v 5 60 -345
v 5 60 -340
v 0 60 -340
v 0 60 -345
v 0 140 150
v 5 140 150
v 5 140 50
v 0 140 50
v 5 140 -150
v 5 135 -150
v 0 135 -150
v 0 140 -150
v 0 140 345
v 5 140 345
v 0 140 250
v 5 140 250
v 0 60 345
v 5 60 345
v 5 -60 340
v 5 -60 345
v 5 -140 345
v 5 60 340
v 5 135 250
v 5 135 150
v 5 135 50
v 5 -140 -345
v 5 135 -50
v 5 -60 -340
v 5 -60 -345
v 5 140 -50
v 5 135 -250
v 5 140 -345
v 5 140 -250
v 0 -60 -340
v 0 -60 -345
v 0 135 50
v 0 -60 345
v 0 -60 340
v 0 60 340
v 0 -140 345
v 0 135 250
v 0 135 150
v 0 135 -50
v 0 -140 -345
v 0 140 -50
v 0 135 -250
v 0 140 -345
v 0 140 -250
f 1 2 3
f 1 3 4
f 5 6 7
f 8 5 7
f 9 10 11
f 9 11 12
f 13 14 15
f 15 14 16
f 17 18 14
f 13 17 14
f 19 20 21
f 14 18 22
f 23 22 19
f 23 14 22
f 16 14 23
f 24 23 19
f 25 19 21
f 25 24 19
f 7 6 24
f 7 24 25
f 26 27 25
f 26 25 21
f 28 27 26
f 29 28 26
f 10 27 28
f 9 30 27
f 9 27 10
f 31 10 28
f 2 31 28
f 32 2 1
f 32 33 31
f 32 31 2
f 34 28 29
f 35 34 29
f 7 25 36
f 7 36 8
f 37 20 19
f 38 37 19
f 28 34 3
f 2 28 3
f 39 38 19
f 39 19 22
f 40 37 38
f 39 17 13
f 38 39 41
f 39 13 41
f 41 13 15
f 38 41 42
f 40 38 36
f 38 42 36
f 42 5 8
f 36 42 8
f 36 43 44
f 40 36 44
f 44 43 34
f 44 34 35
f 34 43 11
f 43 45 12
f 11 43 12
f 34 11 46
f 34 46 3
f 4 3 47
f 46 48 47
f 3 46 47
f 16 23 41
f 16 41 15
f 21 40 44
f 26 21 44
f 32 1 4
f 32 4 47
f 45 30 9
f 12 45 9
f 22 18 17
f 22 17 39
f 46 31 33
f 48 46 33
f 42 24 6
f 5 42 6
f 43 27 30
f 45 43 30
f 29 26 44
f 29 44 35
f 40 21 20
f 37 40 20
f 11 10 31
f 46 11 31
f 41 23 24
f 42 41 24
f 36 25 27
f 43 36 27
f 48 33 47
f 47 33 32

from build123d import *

# Parameters (mm, degrees)
SKIZZE1_W                       = 680
SKIZZE1_H                       = 280
AUFSATZ_LINEAR_AUSTRAGEN1_DEPTH = 5
SKIZZE2_W                       = 5
SKIZZE2_H                       = 80
AUFSATZ_LINEAR_AUSTRAGEN2_DEPTH = 5
SKIZZE3_W                       = 100
SKIZZE3_H                       = 5
SCHNITT_LINEAR_AUSTRAGEN1_DEPTH = 373.357355238


with BuildPart() as part:
    # Skizze1 → Aufsatz-Linear austragen1 (new body)
    with BuildSketch(Plane(origin=(0, 0, 0), x_dir=(0, 0, -1), z_dir=(1, 0, 0))):
        Rectangle(SKIZZE1_W, SKIZZE1_H)
    extrude(amount=AUFSATZ_LINEAR_AUSTRAGEN1_DEPTH)

    # Skizze2 → Aufsatz-Linear austragen2 (add)
    with BuildSketch(Plane(origin=(5, 0, 0), x_dir=(0, 0, -1), z_dir=(1, 0, 0))):
        with Locations((-342.5, 100)):
            Rectangle(SKIZZE2_W, SKIZZE2_H)
        with Locations((-342.5, -100)):
            Rectangle(SKIZZE2_W, SKIZZE2_H)
        with Locations((342.5, -100)):
            Rectangle(SKIZZE2_W, SKIZZE2_H)
        with Locations((342.5, 100)):
            Rectangle(SKIZZE2_W, SKIZZE2_H)
    extrude(amount=-AUFSATZ_LINEAR_AUSTRAGEN2_DEPTH)

    # Skizze3 → Schnitt-Linear austragen1 (cut, through all)
    with BuildSketch(Plane(origin=(5, 0, 0), x_dir=(0, 0, -1), z_dir=(1, 0, 0))):
        with Locations((200, 137.5)):
            Rectangle(SKIZZE3_W, SKIZZE3_H)
        with Locations((-200, 137.5)):
            Rectangle(SKIZZE3_W, SKIZZE3_H)
        with Locations((0, 137.5)):
            Rectangle(SKIZZE3_W, SKIZZE3_H)
    extrude(amount=-SCHNITT_LINEAR_AUSTRAGEN1_DEPTH, mode=Mode.SUBTRACT)


solid = part.part
